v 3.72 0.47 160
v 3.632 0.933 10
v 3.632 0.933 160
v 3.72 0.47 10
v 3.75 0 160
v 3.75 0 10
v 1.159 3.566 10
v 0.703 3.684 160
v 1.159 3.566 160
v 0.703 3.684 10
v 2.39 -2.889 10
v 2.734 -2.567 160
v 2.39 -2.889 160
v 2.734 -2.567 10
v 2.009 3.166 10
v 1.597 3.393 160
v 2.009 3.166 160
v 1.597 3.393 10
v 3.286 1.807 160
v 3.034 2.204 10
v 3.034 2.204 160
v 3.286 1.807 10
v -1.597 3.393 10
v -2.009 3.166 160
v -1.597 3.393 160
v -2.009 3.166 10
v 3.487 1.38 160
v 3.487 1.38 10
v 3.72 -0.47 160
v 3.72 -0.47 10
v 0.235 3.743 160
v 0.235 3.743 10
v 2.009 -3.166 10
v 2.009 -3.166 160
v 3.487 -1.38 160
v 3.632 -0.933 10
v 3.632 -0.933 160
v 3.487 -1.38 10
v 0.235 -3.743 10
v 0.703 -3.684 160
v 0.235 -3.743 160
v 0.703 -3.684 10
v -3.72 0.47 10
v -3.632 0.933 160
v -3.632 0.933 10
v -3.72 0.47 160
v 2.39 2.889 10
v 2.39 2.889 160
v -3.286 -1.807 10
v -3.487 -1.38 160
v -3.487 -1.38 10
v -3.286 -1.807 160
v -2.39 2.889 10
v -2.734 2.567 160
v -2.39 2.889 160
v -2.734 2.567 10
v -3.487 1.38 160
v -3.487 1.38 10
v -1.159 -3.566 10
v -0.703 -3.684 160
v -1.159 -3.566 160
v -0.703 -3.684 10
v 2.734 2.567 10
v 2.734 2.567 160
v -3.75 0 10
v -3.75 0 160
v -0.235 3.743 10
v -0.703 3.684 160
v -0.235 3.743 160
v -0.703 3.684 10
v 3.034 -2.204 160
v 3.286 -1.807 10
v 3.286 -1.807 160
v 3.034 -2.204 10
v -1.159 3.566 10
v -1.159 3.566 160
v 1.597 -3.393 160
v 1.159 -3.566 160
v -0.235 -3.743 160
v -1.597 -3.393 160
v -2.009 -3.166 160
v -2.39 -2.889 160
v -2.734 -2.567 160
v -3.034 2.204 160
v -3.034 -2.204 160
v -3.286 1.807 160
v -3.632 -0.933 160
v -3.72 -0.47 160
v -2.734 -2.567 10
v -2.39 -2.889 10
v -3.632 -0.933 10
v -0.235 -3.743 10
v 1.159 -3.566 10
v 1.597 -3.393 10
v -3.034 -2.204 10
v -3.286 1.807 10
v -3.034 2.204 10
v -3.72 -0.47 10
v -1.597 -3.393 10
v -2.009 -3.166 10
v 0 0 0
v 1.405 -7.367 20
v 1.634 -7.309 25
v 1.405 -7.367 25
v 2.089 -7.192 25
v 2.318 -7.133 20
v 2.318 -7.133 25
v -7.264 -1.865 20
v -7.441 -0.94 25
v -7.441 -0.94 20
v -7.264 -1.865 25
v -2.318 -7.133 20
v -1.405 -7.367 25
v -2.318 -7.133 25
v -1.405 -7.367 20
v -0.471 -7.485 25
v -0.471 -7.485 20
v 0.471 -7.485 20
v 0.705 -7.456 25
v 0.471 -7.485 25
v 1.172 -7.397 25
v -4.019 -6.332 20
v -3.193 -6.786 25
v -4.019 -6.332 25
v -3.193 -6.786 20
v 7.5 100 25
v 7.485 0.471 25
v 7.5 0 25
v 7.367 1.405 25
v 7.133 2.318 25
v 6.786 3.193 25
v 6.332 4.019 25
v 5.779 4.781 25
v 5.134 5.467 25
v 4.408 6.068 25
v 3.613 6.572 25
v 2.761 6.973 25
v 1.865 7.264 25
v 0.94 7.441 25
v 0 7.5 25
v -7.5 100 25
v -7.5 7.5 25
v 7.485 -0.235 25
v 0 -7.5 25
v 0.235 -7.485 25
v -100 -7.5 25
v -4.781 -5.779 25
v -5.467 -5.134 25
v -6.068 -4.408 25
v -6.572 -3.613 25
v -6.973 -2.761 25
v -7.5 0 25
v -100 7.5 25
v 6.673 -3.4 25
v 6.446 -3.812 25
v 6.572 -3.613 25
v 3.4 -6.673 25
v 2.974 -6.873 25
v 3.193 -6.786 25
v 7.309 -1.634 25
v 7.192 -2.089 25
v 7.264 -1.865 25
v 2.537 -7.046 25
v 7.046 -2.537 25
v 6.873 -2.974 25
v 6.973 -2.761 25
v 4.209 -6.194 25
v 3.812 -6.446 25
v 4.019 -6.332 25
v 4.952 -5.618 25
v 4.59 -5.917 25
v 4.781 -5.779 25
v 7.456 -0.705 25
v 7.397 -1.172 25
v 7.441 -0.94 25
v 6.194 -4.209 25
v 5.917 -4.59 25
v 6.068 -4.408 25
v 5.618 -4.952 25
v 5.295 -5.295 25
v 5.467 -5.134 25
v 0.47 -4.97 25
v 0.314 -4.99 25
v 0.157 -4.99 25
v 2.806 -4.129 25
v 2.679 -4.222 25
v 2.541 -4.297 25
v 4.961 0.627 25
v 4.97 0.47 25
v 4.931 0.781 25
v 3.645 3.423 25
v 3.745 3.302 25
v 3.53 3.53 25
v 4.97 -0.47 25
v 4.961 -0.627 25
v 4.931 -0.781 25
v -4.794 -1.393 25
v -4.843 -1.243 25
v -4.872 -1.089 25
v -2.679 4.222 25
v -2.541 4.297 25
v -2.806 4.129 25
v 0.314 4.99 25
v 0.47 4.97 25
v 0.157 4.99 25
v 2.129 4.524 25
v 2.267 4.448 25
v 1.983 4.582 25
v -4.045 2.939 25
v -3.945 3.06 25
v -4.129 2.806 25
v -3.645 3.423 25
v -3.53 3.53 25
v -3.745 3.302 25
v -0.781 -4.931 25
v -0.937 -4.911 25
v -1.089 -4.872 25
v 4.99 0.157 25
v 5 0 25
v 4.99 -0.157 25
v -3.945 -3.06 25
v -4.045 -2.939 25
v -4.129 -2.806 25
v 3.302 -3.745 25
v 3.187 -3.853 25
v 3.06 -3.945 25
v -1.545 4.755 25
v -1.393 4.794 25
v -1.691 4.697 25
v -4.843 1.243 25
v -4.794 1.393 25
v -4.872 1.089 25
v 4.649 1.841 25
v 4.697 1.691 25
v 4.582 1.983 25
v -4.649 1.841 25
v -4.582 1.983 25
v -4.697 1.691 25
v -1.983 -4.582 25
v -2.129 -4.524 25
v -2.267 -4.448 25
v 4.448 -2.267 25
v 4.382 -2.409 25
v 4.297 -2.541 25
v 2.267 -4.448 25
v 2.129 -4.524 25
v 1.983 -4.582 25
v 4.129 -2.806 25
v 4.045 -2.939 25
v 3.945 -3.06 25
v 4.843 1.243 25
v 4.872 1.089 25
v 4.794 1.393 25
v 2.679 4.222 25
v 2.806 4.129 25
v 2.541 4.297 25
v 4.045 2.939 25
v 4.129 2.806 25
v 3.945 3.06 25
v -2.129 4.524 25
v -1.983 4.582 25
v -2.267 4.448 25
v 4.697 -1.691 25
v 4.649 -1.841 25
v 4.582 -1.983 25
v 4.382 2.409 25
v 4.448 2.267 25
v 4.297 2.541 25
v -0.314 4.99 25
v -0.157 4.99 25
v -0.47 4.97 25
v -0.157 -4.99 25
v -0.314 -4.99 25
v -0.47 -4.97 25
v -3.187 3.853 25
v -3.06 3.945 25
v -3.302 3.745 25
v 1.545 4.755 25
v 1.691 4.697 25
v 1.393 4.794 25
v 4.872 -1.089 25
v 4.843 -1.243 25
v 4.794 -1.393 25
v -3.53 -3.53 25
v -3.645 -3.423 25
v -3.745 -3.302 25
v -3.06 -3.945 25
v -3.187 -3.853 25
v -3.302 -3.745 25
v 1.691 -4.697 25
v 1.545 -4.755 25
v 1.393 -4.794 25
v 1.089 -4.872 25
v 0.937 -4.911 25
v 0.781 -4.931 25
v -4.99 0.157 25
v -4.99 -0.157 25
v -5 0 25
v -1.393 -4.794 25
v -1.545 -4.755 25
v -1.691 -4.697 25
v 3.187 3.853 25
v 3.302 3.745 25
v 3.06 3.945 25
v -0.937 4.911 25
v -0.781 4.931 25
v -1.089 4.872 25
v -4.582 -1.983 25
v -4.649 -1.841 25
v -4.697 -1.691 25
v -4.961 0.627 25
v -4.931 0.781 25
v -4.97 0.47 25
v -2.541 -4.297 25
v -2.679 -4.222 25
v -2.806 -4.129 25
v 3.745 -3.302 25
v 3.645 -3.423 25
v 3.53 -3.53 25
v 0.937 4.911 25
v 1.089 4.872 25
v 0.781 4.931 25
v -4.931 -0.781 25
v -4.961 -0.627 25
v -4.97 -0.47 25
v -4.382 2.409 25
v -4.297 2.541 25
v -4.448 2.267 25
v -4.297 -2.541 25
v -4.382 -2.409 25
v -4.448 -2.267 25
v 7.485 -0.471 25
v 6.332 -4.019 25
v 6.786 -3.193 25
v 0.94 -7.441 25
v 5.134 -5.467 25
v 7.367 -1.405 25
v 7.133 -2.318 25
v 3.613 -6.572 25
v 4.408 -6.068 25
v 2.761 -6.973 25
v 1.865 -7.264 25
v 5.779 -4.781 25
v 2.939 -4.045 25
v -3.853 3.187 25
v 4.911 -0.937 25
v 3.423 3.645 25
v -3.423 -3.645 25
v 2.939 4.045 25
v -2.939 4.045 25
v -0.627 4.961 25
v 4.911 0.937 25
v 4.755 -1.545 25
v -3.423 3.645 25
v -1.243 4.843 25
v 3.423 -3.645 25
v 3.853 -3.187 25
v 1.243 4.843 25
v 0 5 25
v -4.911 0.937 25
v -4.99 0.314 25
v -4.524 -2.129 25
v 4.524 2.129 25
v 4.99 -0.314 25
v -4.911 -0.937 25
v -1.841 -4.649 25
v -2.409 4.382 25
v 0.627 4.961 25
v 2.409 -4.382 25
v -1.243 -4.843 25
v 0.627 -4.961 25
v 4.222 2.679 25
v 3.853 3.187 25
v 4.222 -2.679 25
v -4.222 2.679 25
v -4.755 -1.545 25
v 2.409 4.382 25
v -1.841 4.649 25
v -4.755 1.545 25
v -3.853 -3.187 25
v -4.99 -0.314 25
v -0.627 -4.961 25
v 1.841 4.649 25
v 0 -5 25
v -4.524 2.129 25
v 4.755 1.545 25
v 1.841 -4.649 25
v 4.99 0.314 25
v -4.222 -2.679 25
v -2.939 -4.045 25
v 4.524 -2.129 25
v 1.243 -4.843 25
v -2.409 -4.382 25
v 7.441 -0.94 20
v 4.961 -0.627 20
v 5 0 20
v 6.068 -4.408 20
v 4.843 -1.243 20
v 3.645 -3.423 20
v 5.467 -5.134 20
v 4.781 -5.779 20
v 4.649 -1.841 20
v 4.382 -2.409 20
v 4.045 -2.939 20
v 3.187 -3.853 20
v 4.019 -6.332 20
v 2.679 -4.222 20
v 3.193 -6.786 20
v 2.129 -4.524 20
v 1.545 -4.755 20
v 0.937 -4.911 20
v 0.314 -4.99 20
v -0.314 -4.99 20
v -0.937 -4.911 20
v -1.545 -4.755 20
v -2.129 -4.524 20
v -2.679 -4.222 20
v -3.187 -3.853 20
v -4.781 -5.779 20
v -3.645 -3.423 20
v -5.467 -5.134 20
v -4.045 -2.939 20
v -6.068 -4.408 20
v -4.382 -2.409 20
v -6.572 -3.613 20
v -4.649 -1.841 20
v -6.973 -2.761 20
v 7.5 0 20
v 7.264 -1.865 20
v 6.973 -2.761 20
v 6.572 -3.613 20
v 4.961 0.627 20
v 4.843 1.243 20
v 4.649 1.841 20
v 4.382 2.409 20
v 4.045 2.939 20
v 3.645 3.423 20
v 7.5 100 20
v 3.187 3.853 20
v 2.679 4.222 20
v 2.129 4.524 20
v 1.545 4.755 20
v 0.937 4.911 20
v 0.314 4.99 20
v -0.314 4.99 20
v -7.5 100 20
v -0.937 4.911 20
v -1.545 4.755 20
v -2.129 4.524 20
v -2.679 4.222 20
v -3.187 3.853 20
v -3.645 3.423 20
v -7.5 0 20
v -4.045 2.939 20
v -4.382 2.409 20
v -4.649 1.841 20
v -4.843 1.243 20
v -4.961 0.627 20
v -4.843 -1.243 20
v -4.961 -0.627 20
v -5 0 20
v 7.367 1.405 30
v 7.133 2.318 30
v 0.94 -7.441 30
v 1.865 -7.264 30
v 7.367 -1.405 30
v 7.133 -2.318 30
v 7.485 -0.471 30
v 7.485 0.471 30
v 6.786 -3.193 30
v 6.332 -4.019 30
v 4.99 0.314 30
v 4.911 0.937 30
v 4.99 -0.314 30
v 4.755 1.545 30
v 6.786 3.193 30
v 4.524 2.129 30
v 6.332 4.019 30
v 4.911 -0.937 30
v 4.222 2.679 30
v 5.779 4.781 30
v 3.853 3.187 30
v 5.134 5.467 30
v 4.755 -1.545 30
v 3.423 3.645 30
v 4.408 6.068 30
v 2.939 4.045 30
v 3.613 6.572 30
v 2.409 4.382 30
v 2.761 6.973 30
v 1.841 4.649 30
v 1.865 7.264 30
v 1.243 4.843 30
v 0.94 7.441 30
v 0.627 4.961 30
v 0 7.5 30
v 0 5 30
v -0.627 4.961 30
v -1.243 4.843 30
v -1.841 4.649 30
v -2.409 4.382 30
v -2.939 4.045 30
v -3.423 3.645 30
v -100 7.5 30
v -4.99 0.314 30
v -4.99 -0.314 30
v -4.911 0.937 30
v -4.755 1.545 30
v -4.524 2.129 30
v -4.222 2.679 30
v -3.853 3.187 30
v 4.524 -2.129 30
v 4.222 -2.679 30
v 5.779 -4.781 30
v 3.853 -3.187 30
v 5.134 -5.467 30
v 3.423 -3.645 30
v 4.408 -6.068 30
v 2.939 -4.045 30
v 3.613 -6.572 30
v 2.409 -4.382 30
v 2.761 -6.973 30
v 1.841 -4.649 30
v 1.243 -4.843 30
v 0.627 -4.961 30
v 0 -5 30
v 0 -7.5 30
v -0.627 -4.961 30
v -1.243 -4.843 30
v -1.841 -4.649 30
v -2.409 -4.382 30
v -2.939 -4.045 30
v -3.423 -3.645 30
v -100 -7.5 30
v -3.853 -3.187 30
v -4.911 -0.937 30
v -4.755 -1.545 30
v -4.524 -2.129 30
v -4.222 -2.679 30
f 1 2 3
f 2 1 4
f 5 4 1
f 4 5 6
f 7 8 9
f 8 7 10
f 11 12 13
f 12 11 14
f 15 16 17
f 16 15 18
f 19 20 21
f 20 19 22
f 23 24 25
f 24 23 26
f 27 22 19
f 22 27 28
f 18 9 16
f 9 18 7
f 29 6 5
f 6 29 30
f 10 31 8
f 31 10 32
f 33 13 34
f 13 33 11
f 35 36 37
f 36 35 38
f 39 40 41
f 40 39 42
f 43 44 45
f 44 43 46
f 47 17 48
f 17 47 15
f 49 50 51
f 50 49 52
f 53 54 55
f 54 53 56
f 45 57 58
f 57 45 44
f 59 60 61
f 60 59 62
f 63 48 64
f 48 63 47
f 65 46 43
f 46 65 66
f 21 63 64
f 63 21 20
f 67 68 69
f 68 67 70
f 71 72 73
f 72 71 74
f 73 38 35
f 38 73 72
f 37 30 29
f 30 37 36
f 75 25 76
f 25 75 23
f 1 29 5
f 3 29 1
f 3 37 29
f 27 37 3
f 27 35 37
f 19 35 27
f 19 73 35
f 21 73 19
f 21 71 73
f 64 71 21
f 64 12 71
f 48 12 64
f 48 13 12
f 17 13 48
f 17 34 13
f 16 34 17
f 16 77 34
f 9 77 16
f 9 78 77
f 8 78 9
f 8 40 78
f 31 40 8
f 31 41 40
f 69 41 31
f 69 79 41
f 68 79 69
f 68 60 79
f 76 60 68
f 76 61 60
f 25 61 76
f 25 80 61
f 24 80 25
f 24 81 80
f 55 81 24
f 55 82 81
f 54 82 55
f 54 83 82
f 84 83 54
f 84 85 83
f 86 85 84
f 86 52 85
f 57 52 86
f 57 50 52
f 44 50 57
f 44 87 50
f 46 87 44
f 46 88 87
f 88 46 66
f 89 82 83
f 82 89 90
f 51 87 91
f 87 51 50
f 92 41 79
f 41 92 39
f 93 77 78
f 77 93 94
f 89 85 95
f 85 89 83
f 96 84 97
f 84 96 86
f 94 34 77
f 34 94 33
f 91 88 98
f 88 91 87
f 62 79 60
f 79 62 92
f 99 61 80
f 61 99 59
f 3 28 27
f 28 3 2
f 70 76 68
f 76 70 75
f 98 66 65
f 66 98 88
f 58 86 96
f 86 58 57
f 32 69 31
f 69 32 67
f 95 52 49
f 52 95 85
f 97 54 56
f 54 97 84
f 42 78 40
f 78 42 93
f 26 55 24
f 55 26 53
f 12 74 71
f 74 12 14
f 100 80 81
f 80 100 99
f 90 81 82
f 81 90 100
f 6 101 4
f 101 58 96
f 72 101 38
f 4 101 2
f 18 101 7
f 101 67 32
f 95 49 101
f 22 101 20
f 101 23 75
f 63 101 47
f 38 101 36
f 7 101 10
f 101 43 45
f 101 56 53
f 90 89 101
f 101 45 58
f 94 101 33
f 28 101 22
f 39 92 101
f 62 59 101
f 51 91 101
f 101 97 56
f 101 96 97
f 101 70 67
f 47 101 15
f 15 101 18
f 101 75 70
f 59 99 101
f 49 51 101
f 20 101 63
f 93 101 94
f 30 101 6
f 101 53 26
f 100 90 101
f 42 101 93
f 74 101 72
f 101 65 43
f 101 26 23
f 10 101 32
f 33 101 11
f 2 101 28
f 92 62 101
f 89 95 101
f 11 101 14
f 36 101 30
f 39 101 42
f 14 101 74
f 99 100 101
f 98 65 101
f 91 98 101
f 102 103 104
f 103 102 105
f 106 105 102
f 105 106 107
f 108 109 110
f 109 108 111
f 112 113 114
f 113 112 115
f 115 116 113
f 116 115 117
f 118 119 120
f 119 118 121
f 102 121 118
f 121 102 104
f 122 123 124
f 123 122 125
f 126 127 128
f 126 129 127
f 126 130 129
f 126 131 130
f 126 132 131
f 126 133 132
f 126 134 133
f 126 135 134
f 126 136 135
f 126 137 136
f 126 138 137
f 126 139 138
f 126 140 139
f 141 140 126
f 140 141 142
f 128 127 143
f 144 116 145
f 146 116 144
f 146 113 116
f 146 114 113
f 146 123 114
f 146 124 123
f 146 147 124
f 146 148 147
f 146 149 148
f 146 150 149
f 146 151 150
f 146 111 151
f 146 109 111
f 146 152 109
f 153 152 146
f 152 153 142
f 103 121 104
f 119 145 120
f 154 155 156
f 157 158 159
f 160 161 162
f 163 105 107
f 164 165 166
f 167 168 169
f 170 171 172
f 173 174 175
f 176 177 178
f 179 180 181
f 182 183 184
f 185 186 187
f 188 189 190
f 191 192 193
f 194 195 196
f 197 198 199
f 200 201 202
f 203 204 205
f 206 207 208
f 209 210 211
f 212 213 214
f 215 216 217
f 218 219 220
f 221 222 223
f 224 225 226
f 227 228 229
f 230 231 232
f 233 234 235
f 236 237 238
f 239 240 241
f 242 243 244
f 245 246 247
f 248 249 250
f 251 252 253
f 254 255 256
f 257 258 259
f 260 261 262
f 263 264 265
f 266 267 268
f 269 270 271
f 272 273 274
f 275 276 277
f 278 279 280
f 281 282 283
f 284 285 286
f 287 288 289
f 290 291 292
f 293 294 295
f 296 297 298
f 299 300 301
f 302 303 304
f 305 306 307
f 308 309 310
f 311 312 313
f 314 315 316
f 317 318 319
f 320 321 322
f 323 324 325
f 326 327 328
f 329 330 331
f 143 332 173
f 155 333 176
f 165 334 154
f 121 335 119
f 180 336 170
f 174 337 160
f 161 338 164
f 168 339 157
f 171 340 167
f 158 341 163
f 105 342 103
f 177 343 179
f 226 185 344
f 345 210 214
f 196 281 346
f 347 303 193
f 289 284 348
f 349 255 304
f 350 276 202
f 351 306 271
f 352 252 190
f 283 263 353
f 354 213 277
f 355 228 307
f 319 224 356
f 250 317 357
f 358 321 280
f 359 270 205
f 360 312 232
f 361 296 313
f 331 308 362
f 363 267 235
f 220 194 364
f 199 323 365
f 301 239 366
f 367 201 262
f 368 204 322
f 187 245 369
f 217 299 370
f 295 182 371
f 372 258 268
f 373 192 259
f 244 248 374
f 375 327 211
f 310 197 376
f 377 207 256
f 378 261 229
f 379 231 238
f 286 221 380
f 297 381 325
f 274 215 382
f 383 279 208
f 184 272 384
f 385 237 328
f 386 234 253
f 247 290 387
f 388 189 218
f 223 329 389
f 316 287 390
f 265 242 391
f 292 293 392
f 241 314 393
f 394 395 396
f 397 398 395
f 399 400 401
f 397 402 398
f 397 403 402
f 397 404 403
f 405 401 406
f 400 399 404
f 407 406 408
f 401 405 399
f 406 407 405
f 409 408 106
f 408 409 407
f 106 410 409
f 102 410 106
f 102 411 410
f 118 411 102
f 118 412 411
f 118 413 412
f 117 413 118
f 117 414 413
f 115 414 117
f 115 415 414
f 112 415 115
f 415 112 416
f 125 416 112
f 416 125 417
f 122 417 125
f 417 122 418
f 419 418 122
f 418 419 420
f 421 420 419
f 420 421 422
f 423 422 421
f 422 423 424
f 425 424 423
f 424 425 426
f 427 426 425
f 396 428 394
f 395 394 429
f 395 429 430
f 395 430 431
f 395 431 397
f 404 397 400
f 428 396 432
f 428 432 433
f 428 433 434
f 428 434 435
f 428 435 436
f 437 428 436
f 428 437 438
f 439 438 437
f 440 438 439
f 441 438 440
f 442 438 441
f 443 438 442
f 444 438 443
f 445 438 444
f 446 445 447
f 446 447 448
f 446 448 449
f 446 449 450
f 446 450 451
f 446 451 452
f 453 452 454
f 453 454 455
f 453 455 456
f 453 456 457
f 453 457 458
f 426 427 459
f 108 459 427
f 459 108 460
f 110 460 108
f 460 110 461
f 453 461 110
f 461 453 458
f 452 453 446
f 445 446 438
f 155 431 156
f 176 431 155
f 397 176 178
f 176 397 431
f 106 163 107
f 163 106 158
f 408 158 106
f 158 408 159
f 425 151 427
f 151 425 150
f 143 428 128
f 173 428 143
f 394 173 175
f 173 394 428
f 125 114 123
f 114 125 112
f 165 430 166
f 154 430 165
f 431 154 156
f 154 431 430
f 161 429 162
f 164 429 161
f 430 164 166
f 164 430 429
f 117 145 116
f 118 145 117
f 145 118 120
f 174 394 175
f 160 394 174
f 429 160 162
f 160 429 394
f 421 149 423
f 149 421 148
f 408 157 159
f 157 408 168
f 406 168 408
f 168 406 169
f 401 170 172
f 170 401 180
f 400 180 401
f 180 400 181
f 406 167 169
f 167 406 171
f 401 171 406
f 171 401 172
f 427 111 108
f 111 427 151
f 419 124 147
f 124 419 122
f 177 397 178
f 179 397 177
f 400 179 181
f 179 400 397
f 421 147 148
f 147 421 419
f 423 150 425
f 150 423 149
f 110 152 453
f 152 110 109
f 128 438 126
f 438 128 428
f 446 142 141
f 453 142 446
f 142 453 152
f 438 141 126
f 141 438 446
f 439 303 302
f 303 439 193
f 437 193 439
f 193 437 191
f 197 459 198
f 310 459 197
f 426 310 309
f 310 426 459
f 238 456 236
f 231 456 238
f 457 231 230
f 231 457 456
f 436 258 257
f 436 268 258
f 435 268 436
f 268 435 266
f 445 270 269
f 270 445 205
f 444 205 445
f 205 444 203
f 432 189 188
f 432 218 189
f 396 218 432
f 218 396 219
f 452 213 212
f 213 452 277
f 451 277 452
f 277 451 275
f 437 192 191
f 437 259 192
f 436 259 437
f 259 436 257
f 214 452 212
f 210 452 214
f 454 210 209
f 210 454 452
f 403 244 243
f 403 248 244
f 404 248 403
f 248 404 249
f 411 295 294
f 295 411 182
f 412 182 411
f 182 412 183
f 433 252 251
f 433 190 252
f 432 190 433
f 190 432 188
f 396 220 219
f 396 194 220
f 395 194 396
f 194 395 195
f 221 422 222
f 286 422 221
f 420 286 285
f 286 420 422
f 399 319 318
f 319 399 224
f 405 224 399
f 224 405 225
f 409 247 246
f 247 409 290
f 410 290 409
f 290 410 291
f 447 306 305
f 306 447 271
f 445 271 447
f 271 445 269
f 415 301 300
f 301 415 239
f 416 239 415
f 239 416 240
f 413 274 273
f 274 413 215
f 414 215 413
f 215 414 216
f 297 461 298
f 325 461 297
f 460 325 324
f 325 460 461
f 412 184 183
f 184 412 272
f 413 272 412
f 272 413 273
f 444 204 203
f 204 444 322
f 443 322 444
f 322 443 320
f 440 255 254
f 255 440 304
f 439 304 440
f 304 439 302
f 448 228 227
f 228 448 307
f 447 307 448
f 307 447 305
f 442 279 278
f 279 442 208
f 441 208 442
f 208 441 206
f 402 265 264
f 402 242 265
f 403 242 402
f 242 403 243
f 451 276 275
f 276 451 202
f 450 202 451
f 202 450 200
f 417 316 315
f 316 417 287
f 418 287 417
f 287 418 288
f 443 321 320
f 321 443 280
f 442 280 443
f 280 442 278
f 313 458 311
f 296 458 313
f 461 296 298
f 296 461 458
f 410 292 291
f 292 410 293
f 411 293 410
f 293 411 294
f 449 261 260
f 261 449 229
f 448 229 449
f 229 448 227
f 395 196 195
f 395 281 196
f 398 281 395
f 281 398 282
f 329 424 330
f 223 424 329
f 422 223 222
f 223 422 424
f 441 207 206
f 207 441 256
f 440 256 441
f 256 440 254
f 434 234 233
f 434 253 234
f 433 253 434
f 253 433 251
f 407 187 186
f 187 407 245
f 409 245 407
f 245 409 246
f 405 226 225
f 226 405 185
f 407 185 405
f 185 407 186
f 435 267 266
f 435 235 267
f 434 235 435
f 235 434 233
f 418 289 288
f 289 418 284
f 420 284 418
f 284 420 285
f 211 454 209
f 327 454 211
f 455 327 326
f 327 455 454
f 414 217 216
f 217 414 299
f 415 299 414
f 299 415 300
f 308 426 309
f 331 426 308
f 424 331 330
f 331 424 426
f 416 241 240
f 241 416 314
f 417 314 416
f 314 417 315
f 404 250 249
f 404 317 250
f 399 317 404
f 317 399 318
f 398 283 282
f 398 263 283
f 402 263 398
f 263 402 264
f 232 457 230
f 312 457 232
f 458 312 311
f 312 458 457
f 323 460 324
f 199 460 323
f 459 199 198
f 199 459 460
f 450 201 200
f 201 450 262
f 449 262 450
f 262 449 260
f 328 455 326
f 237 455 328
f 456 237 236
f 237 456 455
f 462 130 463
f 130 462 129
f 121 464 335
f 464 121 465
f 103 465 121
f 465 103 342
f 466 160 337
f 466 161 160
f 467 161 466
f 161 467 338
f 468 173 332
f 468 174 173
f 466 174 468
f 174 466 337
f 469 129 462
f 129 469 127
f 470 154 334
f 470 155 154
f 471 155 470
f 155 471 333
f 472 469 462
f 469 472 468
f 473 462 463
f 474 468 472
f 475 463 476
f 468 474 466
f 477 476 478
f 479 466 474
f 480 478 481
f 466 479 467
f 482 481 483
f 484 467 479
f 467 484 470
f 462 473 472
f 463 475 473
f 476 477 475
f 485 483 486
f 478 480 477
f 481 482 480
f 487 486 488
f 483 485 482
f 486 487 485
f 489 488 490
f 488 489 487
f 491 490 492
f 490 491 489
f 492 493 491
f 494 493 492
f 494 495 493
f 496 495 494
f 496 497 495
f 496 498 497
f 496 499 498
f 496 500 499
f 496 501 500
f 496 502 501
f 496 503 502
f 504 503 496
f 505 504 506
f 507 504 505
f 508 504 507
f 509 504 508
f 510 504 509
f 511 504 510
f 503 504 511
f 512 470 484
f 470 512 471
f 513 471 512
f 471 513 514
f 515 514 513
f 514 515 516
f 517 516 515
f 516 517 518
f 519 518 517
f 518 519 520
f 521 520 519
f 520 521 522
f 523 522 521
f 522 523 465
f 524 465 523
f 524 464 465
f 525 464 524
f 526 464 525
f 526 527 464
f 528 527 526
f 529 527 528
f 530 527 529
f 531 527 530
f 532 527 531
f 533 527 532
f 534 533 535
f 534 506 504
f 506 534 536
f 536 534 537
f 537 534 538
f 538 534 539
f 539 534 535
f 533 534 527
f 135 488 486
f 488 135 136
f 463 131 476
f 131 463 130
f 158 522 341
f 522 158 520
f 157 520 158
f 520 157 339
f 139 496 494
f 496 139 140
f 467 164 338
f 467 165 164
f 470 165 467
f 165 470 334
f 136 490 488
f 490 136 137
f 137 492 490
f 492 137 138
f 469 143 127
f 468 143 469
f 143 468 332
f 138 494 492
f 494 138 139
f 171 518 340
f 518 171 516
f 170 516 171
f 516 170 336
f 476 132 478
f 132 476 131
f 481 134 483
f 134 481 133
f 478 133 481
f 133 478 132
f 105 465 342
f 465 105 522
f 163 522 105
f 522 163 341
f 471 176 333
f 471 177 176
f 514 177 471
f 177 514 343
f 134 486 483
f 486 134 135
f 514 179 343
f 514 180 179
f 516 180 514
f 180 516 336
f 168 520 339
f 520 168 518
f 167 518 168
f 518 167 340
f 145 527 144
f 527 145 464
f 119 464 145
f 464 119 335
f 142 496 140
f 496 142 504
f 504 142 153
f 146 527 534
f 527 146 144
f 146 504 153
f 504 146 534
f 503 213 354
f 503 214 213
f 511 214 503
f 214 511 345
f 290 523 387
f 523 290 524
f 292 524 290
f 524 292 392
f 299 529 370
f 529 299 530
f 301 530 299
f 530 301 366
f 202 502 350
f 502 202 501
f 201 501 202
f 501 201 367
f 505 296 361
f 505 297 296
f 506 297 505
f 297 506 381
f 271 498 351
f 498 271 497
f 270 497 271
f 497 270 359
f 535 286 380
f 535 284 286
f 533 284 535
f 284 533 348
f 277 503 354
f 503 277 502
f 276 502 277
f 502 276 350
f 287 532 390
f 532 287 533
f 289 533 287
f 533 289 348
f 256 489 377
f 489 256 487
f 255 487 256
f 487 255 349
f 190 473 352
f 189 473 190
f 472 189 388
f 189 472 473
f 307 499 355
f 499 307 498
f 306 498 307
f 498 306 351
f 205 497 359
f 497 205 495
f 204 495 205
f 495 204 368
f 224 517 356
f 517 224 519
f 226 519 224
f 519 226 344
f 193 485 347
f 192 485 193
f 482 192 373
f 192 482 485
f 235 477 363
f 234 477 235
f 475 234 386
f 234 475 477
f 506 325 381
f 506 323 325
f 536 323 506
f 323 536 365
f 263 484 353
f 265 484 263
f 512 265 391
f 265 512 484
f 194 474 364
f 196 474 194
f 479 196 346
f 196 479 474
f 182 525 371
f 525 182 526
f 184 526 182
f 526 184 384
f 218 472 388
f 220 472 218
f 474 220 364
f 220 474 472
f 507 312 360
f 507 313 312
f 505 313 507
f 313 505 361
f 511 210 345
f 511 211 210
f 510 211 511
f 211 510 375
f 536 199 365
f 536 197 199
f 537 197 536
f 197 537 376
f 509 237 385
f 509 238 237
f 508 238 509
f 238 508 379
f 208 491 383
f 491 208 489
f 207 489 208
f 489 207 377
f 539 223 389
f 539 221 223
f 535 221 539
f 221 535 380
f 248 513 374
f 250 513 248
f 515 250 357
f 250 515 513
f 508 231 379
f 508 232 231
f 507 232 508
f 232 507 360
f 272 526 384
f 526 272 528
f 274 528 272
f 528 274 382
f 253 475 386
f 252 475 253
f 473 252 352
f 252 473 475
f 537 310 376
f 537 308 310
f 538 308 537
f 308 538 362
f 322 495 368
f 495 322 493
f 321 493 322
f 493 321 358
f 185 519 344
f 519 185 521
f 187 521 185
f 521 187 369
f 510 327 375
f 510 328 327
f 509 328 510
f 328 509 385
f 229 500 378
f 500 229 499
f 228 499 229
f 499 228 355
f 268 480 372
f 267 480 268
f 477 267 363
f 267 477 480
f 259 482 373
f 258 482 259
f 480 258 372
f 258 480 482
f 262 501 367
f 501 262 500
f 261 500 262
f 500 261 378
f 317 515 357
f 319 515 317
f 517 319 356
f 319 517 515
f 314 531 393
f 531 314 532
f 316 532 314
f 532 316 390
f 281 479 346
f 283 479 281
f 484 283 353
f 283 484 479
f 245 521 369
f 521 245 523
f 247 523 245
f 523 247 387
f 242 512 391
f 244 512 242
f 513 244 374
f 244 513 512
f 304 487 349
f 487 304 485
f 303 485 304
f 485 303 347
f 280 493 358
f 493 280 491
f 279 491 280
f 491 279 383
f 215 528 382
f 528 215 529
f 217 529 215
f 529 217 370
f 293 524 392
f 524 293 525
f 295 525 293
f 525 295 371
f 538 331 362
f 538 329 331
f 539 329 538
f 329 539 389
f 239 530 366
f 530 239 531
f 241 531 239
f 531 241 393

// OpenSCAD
$fn = 50;

module stift() {
  translate([0, 0, 10]) {  cylinder(150, d=7.5); }
  cylinder( 10, d2=7.5, d1=0);
}

module arm() {
  difference() {
    union() {
      cylinder(5, d=15);
      translate([-7.5, 0, 0]) { cube([15, 100, 5]); }
    }
    cylinder(5, d=10);
  }
}

module demo() {
  stift();
  color("red") { translate([0 , 0, 20]) { arm(); } }
  color("blue") { rotate([0,0,90]) { translate([0 , 0, 20+5]) { arm(); } } }
}

demo();
$vpr = [ 72.50, 0.00, 39.00 ];
$vpt = [ -9.52, 3.76, 33.00 ];
